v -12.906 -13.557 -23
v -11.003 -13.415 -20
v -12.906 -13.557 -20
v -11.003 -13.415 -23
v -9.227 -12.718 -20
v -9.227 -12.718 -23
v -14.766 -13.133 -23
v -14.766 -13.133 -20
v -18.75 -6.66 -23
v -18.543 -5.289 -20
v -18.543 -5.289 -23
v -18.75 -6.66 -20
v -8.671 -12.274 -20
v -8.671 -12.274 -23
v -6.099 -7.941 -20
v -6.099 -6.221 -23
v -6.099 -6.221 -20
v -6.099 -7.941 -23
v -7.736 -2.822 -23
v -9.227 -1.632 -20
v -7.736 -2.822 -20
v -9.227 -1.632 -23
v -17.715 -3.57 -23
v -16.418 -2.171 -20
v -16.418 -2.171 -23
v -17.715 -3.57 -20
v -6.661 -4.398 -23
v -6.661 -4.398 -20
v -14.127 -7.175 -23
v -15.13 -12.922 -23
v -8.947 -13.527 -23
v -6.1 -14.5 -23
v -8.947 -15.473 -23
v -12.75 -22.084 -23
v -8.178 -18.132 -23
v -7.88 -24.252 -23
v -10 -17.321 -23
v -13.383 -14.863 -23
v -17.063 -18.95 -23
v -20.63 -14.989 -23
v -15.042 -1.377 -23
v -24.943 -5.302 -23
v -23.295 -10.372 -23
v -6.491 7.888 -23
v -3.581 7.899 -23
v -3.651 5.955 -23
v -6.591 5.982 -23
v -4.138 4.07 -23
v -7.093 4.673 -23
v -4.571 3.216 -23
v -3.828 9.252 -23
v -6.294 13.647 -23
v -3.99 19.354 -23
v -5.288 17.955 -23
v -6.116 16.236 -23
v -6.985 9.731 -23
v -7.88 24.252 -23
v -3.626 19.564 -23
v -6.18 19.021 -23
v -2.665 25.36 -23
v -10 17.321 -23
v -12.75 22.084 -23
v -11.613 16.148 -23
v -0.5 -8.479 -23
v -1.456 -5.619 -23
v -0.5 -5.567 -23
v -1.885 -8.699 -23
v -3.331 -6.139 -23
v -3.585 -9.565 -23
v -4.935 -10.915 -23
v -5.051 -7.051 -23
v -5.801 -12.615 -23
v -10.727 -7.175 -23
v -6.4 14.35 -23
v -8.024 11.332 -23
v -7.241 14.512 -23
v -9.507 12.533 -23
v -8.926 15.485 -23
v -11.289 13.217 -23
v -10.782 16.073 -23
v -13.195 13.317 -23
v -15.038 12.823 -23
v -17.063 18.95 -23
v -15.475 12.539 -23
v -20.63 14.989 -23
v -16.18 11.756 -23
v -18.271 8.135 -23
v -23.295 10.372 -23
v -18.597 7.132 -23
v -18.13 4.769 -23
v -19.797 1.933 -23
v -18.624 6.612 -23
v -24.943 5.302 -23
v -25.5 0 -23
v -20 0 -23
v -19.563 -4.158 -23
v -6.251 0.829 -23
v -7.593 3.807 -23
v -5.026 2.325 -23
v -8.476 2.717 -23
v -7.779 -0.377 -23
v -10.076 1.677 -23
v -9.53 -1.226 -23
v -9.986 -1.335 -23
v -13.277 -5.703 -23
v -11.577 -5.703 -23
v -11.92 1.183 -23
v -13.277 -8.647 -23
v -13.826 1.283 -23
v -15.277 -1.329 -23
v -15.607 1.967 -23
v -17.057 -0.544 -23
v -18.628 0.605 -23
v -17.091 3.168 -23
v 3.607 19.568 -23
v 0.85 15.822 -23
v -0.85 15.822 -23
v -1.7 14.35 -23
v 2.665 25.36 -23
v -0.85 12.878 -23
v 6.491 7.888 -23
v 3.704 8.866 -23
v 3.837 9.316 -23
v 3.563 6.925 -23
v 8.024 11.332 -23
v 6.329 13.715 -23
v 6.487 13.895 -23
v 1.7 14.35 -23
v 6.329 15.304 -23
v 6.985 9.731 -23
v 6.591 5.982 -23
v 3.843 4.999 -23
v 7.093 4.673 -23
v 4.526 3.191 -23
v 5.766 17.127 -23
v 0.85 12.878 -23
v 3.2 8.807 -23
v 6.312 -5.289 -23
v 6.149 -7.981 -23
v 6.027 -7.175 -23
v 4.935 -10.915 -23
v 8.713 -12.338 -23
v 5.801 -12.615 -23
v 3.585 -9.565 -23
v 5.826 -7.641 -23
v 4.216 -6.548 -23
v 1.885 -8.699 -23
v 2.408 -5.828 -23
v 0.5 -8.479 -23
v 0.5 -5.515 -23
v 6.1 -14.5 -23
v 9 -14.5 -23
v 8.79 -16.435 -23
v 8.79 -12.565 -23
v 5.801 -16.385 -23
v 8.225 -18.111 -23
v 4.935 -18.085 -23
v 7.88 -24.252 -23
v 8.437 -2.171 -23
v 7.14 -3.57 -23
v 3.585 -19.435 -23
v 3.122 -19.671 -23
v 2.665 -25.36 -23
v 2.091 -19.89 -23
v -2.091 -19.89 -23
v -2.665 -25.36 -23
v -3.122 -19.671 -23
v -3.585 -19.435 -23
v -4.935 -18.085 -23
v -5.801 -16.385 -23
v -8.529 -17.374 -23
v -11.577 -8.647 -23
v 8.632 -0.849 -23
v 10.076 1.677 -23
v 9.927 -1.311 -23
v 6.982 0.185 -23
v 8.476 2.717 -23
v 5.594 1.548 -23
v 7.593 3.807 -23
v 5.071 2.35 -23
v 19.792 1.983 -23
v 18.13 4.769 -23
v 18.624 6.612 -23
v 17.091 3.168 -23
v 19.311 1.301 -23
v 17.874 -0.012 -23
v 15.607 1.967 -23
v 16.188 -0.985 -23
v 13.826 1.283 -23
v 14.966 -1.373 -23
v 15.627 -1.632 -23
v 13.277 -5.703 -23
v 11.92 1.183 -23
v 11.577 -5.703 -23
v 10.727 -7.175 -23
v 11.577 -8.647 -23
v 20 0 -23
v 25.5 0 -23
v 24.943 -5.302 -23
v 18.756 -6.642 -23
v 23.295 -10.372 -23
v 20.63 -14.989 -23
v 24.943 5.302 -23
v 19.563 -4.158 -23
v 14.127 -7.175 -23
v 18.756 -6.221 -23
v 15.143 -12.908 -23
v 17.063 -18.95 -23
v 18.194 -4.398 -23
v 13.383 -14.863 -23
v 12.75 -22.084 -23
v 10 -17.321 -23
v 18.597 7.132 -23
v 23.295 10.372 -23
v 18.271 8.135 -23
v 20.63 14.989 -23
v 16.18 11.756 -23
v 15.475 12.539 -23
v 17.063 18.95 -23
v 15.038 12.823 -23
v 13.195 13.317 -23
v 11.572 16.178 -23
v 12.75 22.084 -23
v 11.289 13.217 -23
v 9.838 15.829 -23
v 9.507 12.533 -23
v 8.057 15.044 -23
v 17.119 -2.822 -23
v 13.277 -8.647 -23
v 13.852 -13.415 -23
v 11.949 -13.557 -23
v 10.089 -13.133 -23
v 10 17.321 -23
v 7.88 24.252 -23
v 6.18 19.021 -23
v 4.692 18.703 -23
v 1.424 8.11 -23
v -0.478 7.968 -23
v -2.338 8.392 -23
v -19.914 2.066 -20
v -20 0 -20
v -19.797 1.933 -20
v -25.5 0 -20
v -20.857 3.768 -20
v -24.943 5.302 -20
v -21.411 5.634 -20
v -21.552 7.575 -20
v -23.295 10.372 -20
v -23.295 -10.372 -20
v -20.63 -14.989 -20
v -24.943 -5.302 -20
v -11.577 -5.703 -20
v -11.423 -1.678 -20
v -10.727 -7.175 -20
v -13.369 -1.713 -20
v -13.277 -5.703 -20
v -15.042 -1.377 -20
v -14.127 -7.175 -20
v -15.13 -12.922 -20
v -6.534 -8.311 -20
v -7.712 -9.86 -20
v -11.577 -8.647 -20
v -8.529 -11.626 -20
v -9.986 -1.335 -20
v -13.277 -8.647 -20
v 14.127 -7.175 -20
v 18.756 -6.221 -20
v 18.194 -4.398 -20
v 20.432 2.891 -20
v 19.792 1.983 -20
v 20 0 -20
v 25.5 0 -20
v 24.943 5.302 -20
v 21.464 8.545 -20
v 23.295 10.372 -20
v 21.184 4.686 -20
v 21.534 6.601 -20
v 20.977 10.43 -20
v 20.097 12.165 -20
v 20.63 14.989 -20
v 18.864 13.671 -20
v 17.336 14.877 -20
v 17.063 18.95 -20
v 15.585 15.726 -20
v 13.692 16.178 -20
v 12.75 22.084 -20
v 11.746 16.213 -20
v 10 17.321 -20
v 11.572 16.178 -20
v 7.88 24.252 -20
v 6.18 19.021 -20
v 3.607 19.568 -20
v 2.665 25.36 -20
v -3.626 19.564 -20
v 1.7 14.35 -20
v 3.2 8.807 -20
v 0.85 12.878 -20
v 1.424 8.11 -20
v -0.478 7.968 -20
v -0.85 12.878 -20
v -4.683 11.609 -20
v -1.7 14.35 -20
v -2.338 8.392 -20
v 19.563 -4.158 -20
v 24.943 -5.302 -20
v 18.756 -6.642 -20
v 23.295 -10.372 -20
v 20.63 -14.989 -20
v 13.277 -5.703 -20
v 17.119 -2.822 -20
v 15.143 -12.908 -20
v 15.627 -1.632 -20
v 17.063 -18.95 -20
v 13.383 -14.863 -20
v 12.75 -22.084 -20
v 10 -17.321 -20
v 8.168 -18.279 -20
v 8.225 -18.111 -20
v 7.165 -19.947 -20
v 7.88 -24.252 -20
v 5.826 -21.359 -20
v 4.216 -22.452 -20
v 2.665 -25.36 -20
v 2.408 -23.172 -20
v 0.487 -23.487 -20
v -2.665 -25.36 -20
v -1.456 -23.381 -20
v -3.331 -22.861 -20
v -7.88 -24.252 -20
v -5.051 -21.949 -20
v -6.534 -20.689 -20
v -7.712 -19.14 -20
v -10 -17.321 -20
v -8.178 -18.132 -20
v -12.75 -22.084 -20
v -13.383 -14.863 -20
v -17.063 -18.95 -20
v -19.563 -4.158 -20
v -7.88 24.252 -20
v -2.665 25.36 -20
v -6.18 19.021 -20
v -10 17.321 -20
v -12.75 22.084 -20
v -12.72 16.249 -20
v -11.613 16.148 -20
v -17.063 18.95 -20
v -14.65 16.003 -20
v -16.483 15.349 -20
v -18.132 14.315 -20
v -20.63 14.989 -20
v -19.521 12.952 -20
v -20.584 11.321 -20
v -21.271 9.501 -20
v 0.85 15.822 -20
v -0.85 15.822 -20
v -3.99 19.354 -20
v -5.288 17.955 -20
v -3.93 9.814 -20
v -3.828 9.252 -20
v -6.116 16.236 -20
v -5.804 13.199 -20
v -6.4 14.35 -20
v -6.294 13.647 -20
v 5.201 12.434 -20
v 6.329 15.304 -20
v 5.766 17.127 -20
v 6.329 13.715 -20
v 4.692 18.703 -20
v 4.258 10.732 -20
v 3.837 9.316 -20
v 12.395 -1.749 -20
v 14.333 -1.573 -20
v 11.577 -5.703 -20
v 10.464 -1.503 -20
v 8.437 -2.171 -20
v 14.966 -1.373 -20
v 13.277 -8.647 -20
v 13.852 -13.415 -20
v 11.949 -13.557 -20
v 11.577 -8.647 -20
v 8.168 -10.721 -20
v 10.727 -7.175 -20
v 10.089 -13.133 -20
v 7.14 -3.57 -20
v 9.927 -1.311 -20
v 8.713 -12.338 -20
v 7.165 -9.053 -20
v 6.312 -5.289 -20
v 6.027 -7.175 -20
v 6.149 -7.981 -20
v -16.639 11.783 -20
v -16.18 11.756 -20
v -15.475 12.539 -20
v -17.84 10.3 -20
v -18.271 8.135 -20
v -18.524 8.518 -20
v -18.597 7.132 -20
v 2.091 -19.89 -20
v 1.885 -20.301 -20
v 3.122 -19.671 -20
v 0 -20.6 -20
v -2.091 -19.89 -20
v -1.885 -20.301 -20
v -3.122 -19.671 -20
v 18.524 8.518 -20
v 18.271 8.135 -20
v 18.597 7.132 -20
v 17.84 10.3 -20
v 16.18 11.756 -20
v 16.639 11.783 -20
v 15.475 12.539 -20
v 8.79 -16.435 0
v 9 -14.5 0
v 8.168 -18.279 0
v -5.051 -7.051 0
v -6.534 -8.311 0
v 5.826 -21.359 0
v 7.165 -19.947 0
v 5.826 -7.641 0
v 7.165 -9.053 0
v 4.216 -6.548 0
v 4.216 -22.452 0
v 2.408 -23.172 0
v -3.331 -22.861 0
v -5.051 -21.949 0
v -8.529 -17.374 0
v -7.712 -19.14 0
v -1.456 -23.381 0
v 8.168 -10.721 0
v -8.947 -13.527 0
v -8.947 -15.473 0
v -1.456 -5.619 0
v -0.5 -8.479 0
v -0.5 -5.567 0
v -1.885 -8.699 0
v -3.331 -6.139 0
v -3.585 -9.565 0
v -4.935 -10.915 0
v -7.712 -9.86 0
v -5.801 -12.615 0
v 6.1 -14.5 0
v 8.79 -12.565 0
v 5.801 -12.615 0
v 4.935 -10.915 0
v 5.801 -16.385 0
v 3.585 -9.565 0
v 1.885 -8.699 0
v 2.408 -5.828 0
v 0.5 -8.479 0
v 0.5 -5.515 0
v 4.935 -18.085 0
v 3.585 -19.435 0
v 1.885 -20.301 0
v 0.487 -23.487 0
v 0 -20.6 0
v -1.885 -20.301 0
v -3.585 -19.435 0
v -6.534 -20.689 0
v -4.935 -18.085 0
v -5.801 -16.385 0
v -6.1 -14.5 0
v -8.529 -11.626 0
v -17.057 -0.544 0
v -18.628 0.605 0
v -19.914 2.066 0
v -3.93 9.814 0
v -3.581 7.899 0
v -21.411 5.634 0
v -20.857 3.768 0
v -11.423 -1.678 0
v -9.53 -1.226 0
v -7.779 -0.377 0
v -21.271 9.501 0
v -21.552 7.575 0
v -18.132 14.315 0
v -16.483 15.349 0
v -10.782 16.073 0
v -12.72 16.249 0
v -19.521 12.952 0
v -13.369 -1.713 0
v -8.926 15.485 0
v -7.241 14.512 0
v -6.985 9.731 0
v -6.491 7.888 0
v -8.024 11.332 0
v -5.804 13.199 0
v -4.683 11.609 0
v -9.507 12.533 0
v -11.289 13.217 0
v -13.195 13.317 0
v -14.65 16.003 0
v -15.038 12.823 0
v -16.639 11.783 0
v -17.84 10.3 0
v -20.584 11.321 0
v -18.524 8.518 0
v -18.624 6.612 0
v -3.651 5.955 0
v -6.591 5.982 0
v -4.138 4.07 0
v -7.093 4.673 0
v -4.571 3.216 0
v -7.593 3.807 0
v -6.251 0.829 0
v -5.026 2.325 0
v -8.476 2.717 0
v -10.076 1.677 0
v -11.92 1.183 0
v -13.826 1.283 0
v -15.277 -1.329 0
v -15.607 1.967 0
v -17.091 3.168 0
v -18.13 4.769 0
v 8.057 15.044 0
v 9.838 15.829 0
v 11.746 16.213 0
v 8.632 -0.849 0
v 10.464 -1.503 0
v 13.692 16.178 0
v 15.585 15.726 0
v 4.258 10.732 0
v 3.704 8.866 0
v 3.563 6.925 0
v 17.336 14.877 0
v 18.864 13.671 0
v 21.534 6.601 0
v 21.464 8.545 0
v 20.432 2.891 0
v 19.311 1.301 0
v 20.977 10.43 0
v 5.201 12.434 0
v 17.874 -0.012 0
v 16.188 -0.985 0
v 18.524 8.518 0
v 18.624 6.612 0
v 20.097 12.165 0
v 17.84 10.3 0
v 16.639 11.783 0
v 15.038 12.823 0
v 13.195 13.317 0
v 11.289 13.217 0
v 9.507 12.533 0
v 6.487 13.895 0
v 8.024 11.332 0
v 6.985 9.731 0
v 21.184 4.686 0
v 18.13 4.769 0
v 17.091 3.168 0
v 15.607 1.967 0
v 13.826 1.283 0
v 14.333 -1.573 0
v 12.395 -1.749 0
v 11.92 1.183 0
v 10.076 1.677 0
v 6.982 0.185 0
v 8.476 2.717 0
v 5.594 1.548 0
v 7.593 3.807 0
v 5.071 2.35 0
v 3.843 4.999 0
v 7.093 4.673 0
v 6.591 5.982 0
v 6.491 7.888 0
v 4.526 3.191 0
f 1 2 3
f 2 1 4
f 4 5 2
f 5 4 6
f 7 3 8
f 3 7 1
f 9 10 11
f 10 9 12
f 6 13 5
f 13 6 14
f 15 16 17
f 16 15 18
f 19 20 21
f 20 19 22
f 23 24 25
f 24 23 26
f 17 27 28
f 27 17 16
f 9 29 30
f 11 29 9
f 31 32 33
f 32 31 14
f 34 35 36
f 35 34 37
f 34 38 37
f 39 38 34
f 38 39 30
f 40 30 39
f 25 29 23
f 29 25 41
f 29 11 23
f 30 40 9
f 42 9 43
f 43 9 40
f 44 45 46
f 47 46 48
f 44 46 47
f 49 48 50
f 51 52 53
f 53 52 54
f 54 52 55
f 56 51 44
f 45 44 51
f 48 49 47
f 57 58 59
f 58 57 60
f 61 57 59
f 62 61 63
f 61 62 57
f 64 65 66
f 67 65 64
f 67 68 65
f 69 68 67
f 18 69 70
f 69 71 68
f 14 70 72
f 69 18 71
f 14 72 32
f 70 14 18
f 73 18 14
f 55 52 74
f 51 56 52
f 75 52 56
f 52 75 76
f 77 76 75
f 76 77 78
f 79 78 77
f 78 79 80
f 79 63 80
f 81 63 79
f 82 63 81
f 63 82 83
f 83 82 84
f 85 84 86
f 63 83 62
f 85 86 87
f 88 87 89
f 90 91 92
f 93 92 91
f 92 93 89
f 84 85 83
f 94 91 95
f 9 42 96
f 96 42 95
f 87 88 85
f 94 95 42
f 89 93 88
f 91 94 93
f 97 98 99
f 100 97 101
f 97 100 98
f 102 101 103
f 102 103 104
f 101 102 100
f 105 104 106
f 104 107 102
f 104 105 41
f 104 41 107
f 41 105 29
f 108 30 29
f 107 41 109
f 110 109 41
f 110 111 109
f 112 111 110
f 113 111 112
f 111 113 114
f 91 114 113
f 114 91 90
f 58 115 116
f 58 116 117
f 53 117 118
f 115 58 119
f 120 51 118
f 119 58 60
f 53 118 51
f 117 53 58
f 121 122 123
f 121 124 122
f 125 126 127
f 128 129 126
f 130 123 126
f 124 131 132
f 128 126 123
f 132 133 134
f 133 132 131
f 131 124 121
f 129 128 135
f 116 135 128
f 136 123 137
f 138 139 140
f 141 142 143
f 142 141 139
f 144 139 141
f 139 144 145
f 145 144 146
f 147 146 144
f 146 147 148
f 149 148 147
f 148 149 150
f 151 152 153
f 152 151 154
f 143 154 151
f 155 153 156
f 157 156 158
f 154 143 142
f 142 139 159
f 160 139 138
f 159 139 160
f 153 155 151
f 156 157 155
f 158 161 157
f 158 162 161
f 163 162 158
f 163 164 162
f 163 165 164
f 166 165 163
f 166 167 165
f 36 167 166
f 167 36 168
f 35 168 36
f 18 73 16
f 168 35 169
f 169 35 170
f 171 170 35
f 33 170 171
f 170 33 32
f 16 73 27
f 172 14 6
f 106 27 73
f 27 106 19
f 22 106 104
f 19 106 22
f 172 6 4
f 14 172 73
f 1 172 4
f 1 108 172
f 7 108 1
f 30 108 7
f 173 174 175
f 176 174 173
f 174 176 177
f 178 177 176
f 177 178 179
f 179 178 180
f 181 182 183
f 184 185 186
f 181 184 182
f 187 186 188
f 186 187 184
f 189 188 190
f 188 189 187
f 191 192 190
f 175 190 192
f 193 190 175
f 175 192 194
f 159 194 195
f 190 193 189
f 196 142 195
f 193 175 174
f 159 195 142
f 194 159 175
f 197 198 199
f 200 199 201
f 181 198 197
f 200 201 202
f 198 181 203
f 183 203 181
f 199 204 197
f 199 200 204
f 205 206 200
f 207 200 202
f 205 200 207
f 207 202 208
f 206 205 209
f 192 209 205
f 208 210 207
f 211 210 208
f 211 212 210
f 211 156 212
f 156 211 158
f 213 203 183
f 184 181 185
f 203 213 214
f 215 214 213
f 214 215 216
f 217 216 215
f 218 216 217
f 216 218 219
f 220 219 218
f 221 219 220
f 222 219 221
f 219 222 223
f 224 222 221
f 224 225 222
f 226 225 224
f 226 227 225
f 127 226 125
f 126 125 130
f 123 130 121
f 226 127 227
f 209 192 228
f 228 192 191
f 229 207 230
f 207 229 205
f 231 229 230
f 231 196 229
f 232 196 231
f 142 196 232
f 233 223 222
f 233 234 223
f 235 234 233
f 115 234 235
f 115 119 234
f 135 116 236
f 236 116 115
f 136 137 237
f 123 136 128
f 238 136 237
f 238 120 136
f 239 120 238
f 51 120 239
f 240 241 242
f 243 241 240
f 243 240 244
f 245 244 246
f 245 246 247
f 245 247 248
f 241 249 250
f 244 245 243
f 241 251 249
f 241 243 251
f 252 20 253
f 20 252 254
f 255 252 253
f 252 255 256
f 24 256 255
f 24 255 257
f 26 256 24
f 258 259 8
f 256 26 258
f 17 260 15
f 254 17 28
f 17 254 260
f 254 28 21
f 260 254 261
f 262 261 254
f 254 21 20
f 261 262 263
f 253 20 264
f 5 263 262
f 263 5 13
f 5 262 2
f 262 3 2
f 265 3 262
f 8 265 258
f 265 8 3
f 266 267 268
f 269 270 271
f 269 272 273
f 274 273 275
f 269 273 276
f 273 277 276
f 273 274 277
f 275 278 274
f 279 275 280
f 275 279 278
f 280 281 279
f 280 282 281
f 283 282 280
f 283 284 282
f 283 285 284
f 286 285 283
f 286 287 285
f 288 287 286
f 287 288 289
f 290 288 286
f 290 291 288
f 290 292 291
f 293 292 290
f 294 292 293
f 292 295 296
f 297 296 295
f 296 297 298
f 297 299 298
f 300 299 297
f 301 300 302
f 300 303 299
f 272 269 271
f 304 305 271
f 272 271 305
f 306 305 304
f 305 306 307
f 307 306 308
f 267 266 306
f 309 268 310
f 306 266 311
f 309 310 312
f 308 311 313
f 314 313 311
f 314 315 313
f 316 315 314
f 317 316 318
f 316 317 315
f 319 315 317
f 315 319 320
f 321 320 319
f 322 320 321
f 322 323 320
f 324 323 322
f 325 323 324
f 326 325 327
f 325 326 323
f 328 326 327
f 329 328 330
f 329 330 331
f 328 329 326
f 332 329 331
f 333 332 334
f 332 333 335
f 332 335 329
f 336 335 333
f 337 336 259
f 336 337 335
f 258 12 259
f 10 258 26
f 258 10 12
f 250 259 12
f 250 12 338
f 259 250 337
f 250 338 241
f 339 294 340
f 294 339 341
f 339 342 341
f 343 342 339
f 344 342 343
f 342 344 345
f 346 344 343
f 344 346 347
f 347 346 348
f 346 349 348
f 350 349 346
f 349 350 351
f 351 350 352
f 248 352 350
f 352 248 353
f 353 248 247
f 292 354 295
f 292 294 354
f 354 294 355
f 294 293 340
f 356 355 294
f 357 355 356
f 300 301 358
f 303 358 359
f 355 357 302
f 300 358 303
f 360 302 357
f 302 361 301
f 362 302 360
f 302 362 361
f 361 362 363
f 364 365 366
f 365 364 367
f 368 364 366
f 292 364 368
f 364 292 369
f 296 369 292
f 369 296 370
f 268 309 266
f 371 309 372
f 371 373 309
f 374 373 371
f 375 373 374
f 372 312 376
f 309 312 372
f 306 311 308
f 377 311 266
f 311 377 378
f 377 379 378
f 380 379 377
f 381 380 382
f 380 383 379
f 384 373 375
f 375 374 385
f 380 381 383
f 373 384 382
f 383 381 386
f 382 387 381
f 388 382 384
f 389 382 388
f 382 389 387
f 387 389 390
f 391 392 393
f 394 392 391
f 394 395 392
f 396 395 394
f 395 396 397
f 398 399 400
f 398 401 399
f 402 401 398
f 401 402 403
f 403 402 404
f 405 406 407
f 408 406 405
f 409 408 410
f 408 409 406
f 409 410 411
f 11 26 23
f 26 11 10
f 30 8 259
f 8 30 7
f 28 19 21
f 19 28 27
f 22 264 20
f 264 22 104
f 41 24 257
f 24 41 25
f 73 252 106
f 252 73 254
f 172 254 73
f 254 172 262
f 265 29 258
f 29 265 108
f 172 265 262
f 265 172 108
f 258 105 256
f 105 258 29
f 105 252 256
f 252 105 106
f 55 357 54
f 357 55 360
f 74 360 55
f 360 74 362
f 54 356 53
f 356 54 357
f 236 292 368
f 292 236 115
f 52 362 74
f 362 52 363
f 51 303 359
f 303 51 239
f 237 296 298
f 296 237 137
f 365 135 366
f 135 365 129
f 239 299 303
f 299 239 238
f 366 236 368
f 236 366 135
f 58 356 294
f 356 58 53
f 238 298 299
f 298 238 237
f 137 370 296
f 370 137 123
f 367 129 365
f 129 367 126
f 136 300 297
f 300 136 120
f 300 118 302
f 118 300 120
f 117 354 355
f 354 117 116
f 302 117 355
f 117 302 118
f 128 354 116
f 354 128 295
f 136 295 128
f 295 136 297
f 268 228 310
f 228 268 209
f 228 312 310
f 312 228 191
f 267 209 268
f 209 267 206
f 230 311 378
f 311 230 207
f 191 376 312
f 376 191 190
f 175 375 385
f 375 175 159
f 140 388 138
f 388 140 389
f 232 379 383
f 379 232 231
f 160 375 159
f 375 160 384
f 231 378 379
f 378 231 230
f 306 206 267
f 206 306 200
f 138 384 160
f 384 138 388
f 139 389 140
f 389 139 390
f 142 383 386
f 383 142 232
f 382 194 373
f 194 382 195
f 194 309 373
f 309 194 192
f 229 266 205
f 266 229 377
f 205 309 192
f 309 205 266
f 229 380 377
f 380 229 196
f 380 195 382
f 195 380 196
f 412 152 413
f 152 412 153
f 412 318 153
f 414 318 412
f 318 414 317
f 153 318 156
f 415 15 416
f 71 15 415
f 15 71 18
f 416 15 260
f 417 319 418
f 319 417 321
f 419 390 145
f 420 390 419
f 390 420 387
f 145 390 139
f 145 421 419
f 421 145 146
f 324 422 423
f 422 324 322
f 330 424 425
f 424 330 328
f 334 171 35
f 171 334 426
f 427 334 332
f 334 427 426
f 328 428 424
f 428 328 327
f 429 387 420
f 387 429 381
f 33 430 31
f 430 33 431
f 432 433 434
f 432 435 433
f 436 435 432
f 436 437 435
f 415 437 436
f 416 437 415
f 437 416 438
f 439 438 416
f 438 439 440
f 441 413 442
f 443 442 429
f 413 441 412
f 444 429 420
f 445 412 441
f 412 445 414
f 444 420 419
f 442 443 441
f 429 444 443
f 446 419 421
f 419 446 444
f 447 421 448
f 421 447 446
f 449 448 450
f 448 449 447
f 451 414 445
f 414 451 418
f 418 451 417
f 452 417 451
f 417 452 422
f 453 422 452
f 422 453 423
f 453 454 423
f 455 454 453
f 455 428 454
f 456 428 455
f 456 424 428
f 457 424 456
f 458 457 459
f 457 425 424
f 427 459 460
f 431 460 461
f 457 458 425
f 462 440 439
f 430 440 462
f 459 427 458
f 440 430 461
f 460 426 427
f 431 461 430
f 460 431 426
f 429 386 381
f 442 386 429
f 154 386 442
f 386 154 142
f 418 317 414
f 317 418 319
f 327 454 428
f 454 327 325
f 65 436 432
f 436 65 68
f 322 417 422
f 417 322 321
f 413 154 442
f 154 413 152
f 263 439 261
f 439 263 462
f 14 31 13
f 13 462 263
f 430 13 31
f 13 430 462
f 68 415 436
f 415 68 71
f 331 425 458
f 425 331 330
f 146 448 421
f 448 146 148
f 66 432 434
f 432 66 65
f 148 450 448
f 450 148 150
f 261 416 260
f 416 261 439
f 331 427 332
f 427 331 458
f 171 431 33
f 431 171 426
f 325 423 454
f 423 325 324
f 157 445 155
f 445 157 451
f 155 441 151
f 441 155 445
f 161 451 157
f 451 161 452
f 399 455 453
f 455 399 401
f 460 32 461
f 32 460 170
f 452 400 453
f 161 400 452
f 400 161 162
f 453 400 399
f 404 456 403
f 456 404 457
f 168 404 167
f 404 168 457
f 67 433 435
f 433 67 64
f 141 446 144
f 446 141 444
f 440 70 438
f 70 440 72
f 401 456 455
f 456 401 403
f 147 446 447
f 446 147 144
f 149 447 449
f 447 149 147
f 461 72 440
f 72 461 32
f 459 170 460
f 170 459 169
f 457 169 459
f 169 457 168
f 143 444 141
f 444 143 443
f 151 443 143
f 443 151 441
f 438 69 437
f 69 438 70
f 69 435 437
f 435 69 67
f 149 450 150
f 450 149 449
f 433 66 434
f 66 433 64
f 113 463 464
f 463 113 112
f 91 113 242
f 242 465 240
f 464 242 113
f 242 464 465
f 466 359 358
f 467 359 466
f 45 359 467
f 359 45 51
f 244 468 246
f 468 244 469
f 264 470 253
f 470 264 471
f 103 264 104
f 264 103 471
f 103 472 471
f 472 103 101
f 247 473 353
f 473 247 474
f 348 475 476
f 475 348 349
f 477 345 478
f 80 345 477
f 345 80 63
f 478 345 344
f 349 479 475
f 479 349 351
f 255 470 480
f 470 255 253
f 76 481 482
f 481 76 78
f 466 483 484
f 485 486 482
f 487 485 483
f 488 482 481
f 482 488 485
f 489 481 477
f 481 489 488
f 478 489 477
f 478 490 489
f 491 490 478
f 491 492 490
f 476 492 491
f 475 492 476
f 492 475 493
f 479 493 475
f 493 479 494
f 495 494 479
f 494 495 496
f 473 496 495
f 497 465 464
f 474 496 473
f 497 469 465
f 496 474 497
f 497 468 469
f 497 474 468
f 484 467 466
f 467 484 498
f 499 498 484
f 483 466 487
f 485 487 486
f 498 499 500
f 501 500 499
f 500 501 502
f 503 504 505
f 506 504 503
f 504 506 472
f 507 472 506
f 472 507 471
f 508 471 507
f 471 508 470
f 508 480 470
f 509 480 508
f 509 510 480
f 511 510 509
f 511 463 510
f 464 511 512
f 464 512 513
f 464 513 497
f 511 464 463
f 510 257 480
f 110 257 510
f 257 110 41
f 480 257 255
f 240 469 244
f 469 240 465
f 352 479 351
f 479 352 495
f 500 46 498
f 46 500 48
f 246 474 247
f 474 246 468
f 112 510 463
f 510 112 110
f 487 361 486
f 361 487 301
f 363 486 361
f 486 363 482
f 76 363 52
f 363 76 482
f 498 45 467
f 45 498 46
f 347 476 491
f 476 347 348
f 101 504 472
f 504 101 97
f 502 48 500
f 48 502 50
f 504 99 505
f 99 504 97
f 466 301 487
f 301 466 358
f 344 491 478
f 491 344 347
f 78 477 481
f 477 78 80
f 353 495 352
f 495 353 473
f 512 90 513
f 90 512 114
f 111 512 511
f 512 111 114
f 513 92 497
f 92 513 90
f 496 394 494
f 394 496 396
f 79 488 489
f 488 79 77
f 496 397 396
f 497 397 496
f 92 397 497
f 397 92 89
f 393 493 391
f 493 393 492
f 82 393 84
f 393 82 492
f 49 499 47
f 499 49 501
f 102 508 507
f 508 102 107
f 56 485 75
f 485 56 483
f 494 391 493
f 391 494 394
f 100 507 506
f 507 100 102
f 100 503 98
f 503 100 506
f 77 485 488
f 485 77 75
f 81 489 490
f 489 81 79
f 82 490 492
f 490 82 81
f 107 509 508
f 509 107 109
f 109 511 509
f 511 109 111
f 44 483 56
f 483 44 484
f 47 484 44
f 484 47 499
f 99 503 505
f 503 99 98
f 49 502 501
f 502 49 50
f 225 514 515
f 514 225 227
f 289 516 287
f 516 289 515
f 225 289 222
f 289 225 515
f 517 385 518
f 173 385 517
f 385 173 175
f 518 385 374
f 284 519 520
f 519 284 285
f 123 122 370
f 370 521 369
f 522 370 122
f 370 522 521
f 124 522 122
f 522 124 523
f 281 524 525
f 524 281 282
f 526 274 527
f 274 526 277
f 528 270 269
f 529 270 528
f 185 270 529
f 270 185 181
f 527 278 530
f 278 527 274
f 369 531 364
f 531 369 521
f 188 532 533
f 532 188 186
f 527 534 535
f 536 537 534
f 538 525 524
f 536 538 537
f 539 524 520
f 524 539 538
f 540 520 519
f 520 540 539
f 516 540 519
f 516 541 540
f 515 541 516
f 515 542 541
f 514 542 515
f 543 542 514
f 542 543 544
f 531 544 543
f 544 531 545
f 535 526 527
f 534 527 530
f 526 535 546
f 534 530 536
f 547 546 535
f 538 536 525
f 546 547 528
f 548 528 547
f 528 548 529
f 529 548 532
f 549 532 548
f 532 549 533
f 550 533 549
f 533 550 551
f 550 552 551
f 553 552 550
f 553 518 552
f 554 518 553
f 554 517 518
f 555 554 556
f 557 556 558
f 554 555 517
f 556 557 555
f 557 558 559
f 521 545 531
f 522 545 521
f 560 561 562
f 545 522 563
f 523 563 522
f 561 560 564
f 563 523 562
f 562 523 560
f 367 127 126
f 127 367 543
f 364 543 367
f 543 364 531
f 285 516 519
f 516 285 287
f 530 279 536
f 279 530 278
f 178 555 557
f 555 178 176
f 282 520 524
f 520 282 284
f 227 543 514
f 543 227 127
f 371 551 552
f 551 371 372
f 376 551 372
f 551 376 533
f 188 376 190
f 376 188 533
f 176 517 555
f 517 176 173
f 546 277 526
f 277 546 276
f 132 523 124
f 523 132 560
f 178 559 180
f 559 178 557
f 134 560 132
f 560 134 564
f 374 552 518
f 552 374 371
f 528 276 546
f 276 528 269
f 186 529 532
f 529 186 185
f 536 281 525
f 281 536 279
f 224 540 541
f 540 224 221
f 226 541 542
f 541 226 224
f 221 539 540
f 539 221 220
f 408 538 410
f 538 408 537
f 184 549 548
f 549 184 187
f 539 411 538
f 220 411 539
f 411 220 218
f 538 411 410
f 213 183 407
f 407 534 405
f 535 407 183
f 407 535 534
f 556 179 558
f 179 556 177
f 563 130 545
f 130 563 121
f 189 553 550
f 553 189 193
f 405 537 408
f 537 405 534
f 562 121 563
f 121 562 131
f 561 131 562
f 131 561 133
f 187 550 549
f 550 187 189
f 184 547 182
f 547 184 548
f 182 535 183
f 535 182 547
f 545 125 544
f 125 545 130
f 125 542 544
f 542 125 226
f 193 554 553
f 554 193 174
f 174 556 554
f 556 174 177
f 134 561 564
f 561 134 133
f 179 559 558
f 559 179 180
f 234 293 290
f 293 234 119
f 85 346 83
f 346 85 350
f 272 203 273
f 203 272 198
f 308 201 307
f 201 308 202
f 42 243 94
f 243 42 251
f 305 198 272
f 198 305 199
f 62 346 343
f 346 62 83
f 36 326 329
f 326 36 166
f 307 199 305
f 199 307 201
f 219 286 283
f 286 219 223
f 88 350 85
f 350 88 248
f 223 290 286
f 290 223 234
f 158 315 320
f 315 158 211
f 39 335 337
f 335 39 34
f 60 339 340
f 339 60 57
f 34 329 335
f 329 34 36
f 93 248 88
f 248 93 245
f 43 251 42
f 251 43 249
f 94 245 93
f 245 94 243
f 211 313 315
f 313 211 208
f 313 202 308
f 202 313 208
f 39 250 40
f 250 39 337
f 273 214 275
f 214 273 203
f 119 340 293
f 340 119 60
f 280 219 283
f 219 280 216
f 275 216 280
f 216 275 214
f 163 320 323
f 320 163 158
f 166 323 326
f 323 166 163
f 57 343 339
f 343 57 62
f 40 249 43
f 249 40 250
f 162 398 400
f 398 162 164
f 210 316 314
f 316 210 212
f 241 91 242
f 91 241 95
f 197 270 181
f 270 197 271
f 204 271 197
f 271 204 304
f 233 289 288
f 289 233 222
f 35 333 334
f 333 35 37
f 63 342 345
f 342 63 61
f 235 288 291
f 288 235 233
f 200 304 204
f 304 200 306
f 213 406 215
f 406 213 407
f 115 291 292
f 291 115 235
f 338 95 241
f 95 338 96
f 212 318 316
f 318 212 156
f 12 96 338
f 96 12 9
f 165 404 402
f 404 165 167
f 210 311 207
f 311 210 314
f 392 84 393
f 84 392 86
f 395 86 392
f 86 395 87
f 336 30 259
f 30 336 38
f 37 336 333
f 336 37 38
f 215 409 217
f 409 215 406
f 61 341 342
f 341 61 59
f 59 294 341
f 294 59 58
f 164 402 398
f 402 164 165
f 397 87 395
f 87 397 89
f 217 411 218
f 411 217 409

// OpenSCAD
// file: Hexa.scad
// include <Hexa.scad>;

m3h = 2.4;
m3k = 5.5;
m3r = m3k/2;

m4h = 3.2;
m4k = 7;
m4r = m4k/2;

m5h = 4.7;
m5k = 8;
m5r = m5k/2;

m6h = 5.2;
m6k = 10;
m6r = m6k/2;

m8h = 6.8;
m8k = 13;
m8r = m8k/2;

coef = 2/sqrt(3);
echo(coef);

module m3(jk=0, jh=0, jvis=0){
    d = m3k * coef;
    cylinder(r=d/2+jk, h=m3h+jh, $fn=6);
    if(jvis != 0){
        translate([0,0,-30]) cylinder(r=3/2+jvis, h=60, $fn=12);
    }
}
// main file
// Cylind_StyloBille.scad
// Tous droits réservés www.mon-fablab.fr - 2017
// Licence GPLv3 - usage NON COMMERCIAL uniquement
// Contributeurs : X. HINAULT, Y. LE GAL

rsty = 6; // rayon stylo
rbig = 43/2;  // rayon cylindre de serrage 

rv = 2.5 + 0.1; // rayon vis
rc = 3; // rayon colonnes
rr = 6; // rayon roulement bille 
rrz = 19; // roulement long


supx = 80;
supz = 20;

epr = 4;
eprr = 3; // épaisseur roulement
epz = 3;

include <Hexa.scad>;
//use<Hexa.scad>;


module rouloum(){
	difference(){
		union(){
			cylinder(r=rbig+epr, h=supz+epz);
		}
		// tube exterieur
		tub();
		// centre interieur
		translate([0,0,-1]) cylinder(r=rbig-epr, h=supz+epz+2);
		//
		for(g=[0:3]){
			rotate([0,0,120*g]) translate([0,rbig-rr-1, 0])  
			translate([0,0,-1])  cylinder(r=rr+0.1, h=supz+1);
		}
		for(g=[0:3]){
			rotate([0,0,120*g]) translate([0,rbig-rr-1, 0]) difference(){
				translate([0,0,-1]) cylinder(r=rc+2, h=supz+epz+2);
			}
		}
	}
	
	difference(){
		union(){
			for(g=[0:3]){
				rotate([0,0,120*g]) translate([0,rbig-rr-1, 0]) difference(){
					cylinder(r=rr+eprr, h=supz+epz);
					translate([0,0,-1])  cylinder(r=rr+0.1, h=supz+epz+2);
					translate([-0.5,-rr-eprr-1,-1])  cube([1, eprr+2, supz+epz+2]);
				}
			}
		}
		tub();
	}
	
	// vis jointures
	for(g=[0:3]){
		rotate([0,0,120*g+60]) translate([0,rbig-epr-m3r-0.4, 0]) difference(){
			translate([0,0,supz]) cylinder(r=epr*1.6, h=epz);
			translate([0,0,supz-1]) cylinder(r=1.7, h=epz+2);
		}
	}
}

module roulsup(){
		// vis jointures
	for(g=[0:3]){
		rotate([0,0,120*g+60]) translate([0,rbig-epr-m3r-0.4, 0]) difference(){
			translate([0,0,supz]) cylinder(r=epr*1.6, h=epz);
			translate([0,0,supz-1]) cylinder(r=1.7, h=epz+2);
		}
	}
	
	for(g=[0:3]){
		rotate([0,0,120*g]) translate([0,rbig-rr-1, 0]) difference(){
			cylinder(r=rr+eprr, h=supz+epz);
			translate([0,0,-1])  cylinder(r=rr+0.1, h=supz+epz+2);
			translate([-0.5,-rr-eprr-1,-1])  cube([1, eprr+2, supz+epz+2]);
		}
	}
	
	translate([0,0,supz]) difference(){
		cylinder(r=rbig+epr, h=epz);
		translate([0,0,-1]) cylinder(r=rbig-1.5, h=supz+epz+2);
	}
	
}



module tub(){
	j = 0.1;
	difference(){
		translate([0,0,-1]) cylinder(r=rbig+epr+1, h=supz+1);
		translate([0,0,-1]) cylinder(r=rbig+j, h=supz+2);
	}
}



module colo(qt=2){ // qt-1 de colonnes serrées
	epcolz = 10;
	eprcol = 3.7;
	j = 0.1; // léger jeux resserrage colonnes;
	// tenues colonnes
	//qt = 0;
	for(g=[0:qt]){
		rotate([0,0,120*g]) translate([0,rbig-rr-1-j, 0]) difference(){
			union(){
				translate([0,0,0]) cylinder(r=rc+eprcol, h=epcolz);
				// plot
				rotate([0,0,-7])
					translate([rc,-eprcol,0]) cube([eprcol+2, eprcol*2, epcolz]);
			}
			rotate([0,0,-7]){
				translate([0,0,-1]) cylinder(r=rc+0.2, h=epcolz+2);
				// fente
				translate([2, -1.5/2, -1]) cube([eprcol*2, 1.5, epcolz+2]);
				// vis serrages
				translate([rc+2.5, eprcol*2, epcolz/2]) rotate([90,0,0]) cylinder(r=1.6, h=eprcol*4, $fn=9);
				translate([rc+2.5, eprcol, epcolz/2]) rotate([-90,0,0]) cylinder(r=m3r+0.4, h=m3h+0.6, $fn=6);
				translate([rc+2.5, -eprcol, epcolz/2]) rotate([90,0,0]) cylinder(r=m3r+0.4, h=m3h+0.6, $fn=6);
			}
				
		}
	}
	if(qt < 2){ // colonnes libres restantes
		for(g=[qt+1:2]){
			rotate([0,0,120*g]) translate([0,rc+eprcol+rsty, 0]) difference(){
				hull(){
					translate([0,0,0])  cylinder(r=rc+eprcol, h=epcolz);
					translate([0,3,0])  cylinder(r=rc+eprcol, h=epcolz);
					// plot
					//rotate([0,0,-7])
					//	translate([rc,-eprcol,0]) cube([eprcol+2, eprcol*2, epcolz]);
				}
				hull(){
					translate([0,0,-1])  cylinder(r=rc+0.3, h=epcolz+2);
					translate([0,3,-1])  cylinder(r=rc+0.3, h=epcolz+2);
				}
				/*
				rotate([0,0,-7]){
				
					// fente
					translate([2, -1, -1]) cube([eprcol*2, 2, epcolz+2]);
					// vis serrages
					translate([rc+2.5, eprcol*2, epcolz/2]) rotate([90,0,0]) cylinder(r=1.6, h=eprcol*4, $fn=9);
					translate([rc+2.5, eprcol, epcolz/2]) rotate([-90,0,0]) cylinder(r=m3r+0.4, h=m3h+0.6, $fn=6);
					translate([rc+2.5, -eprcol, epcolz/2]) rotate([90,0,0]) cylinder(r=m3r+0.4, h=m3h+0.6, $fn=6);
				}
				*/	
			}
		}
	}
	// centre tenue stylo
	difference(){
		cylinder(r=rsty+eprcol, h=epcolz);
		translate([0,0,-1]) cylinder(r=rsty, h=epcolz+2);
		//
		for(g=[0:qt]){
			rotate([0,0,120*g]) translate([0,rbig-rr-1, 0]){
				rotate([0,0,-7]){
					translate([rc+2.5, eprcol*2, epcolz/2]) rotate([90,0,0]) cylinder(r=1.6, h=eprcol*4+2, $fn=9);
					//translate([rc+2.5, eprcol, epcolz/2]) rotate([-90,0,0]) cylinder(r=3.5, h=eprcol);
					translate([rc+2.5, -eprcol, epcolz/2]) rotate([90,0,0]) cylinder(r=m3r+0.4, h=m3h+0.6, $fn=6);
					translate([rc+2.5+2.5, -eprcol, epcolz/2]) rotate([90,0,0]) cylinder(r=m3r+0.4, h=m3h+0.6, $fn=6);
				}
			}
		}
		for(g=[0:3]){
			rotate([0,0,120*g -10]) translate([0,0,epcolz/2]) rotate([90,0,0]) cylinder(r=1.5, h=rsty+eprcol+1, $fn=9);
		}
	}
}

//colo();
//translate([0,0,-supz]) rouloum();


//colo(2); // bas
//translate([0,40,0]) colo(0);

// Pour impression
//rotate([180,0,0]) rouloum();

rotate([180,0,0]) roulsup();
